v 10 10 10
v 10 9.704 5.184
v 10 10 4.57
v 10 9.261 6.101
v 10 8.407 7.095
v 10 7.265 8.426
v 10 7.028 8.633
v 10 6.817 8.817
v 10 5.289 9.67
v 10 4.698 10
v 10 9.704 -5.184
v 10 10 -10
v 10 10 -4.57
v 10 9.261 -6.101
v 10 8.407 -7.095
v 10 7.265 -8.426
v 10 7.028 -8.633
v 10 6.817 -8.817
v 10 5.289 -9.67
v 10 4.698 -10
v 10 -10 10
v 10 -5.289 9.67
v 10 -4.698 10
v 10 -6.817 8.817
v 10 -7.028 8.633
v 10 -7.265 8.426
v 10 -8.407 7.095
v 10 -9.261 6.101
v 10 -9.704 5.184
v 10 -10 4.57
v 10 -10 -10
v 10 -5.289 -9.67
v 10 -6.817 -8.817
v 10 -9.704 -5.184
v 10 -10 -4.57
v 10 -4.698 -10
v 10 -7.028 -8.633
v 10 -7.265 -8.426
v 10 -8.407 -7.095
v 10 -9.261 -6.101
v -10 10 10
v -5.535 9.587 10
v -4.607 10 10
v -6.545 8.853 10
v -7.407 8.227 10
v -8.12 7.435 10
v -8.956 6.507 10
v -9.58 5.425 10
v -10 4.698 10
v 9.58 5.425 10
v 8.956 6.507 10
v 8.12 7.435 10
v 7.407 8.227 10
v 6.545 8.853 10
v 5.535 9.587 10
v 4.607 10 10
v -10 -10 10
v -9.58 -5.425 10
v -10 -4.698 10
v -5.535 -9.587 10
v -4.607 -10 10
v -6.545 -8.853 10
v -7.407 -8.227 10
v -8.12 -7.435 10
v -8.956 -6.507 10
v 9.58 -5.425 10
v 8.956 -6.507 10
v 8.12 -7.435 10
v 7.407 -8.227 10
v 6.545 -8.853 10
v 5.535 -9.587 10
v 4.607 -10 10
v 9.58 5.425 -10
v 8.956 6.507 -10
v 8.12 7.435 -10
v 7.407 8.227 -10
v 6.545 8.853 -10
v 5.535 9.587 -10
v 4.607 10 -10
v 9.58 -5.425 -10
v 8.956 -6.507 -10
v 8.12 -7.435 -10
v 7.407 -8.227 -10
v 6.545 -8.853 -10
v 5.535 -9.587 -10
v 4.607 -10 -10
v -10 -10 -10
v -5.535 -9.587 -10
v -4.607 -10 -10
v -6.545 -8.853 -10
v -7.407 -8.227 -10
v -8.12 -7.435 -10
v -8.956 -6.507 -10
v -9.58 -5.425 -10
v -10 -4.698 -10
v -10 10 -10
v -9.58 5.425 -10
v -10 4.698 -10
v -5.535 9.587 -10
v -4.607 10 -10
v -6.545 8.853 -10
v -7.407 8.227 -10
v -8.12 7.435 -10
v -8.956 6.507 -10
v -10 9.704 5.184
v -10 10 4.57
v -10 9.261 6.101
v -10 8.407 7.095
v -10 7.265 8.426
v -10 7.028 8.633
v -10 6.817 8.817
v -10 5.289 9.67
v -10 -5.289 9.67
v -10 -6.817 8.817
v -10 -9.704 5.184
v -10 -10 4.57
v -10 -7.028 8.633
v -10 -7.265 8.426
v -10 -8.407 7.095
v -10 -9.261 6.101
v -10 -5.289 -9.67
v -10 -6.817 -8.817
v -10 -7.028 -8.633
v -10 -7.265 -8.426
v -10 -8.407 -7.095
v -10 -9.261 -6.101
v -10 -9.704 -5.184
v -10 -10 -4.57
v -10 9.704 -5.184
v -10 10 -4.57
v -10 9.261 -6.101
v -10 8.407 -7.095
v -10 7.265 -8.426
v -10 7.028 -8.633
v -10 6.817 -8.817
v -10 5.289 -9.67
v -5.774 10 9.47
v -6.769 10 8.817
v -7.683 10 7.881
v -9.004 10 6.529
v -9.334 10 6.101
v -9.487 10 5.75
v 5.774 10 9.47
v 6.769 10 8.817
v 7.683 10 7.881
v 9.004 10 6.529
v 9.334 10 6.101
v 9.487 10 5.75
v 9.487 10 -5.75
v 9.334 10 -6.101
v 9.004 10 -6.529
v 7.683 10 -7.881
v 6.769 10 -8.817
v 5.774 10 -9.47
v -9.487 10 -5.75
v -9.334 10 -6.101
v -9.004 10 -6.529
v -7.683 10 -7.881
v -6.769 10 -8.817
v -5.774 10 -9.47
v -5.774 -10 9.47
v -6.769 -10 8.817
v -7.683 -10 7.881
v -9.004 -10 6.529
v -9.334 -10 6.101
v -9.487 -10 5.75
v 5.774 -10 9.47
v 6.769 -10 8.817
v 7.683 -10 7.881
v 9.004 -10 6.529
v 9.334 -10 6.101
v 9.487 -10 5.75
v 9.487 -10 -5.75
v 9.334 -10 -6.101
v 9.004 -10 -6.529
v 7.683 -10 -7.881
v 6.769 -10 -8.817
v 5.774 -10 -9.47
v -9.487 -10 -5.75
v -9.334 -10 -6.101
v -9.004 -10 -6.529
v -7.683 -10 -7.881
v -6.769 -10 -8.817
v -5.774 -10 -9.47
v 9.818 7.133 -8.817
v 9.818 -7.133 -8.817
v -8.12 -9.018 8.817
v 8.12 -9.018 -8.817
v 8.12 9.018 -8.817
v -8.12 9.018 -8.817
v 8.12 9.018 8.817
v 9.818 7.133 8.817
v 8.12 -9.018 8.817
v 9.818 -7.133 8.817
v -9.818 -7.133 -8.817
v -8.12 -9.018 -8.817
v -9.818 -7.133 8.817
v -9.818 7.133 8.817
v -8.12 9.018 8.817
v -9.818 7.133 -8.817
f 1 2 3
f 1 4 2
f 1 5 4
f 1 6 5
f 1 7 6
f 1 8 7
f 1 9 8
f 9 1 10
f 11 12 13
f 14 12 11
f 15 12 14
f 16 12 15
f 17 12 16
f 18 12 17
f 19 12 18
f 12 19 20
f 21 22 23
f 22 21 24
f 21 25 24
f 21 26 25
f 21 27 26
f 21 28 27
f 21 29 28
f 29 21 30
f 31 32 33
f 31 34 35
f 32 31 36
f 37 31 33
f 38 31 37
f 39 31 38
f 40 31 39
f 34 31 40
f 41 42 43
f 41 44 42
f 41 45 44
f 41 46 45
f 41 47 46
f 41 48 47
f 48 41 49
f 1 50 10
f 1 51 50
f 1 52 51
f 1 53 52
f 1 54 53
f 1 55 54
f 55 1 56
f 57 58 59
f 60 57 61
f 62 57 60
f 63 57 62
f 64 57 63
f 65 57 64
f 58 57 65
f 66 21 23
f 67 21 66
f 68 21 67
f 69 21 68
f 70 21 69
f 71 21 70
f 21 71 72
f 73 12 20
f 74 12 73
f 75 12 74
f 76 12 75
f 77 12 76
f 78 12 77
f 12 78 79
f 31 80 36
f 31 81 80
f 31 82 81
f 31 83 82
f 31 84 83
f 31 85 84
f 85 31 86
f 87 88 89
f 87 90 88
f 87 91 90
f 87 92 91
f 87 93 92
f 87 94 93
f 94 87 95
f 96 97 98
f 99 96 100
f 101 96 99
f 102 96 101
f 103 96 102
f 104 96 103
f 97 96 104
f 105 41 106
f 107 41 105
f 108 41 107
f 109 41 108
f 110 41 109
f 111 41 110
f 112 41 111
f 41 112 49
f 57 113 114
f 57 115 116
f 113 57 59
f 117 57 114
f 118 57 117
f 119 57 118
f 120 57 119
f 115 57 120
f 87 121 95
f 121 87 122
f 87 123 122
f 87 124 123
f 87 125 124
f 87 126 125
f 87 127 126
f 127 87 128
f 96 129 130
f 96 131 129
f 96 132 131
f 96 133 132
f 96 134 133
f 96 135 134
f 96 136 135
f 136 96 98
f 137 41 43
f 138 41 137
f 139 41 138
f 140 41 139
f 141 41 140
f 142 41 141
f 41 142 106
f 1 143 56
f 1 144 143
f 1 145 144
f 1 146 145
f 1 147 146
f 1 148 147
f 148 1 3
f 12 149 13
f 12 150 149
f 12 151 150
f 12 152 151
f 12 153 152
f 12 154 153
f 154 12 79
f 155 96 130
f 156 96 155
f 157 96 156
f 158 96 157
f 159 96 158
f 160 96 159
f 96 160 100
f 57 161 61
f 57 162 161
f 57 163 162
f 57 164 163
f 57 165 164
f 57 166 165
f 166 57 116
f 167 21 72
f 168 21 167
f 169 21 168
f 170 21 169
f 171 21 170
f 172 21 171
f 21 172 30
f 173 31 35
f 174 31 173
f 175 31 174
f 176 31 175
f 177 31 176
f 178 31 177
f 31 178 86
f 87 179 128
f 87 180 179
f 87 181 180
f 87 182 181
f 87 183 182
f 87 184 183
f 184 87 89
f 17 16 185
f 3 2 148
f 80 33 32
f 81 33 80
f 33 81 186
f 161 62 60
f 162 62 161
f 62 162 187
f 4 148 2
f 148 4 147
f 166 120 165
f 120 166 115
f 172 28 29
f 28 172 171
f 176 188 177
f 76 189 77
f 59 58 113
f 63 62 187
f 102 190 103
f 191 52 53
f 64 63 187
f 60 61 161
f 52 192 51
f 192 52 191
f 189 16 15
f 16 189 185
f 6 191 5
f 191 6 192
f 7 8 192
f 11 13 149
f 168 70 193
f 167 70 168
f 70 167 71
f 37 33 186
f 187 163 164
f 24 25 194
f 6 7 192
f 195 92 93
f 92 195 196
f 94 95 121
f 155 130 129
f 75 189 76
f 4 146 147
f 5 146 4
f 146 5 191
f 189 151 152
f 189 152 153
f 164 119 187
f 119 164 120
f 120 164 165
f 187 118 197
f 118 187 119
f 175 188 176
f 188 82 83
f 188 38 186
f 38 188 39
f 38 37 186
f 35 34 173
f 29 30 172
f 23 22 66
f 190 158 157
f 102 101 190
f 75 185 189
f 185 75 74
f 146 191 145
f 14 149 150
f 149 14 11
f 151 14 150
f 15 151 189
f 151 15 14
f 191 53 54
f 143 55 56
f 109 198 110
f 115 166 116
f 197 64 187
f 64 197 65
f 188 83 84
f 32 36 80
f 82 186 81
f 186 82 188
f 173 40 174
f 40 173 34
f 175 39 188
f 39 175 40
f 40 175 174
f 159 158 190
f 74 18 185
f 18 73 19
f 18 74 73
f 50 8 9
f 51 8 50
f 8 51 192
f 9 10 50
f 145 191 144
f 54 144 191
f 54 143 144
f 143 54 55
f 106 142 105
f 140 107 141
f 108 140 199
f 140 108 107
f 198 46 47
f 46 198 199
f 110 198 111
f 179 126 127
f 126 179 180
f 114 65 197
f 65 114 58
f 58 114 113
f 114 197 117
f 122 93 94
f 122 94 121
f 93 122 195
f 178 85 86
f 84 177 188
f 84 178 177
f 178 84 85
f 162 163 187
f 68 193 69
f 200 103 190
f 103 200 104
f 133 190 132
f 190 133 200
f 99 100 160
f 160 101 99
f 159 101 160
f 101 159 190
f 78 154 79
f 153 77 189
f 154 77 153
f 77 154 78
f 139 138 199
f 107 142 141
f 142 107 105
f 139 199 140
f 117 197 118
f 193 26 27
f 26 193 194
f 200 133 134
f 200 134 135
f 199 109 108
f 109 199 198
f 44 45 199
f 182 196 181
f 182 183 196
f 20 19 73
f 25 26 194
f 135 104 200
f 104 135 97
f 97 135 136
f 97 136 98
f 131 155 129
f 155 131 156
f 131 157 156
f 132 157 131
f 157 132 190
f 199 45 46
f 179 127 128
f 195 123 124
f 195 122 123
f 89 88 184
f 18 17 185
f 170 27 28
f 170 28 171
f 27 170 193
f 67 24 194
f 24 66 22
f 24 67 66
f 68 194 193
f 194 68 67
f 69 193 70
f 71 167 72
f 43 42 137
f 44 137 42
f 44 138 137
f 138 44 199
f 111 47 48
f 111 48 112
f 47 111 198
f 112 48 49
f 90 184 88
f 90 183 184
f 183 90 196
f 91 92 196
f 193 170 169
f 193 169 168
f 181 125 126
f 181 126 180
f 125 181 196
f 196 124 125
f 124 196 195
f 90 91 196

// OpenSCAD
// A subtraction that leaves coincident faces: the classic non-manifold source.
difference() {
    cube(20, center = true);
    sphere(r = 15, center = true);
}
